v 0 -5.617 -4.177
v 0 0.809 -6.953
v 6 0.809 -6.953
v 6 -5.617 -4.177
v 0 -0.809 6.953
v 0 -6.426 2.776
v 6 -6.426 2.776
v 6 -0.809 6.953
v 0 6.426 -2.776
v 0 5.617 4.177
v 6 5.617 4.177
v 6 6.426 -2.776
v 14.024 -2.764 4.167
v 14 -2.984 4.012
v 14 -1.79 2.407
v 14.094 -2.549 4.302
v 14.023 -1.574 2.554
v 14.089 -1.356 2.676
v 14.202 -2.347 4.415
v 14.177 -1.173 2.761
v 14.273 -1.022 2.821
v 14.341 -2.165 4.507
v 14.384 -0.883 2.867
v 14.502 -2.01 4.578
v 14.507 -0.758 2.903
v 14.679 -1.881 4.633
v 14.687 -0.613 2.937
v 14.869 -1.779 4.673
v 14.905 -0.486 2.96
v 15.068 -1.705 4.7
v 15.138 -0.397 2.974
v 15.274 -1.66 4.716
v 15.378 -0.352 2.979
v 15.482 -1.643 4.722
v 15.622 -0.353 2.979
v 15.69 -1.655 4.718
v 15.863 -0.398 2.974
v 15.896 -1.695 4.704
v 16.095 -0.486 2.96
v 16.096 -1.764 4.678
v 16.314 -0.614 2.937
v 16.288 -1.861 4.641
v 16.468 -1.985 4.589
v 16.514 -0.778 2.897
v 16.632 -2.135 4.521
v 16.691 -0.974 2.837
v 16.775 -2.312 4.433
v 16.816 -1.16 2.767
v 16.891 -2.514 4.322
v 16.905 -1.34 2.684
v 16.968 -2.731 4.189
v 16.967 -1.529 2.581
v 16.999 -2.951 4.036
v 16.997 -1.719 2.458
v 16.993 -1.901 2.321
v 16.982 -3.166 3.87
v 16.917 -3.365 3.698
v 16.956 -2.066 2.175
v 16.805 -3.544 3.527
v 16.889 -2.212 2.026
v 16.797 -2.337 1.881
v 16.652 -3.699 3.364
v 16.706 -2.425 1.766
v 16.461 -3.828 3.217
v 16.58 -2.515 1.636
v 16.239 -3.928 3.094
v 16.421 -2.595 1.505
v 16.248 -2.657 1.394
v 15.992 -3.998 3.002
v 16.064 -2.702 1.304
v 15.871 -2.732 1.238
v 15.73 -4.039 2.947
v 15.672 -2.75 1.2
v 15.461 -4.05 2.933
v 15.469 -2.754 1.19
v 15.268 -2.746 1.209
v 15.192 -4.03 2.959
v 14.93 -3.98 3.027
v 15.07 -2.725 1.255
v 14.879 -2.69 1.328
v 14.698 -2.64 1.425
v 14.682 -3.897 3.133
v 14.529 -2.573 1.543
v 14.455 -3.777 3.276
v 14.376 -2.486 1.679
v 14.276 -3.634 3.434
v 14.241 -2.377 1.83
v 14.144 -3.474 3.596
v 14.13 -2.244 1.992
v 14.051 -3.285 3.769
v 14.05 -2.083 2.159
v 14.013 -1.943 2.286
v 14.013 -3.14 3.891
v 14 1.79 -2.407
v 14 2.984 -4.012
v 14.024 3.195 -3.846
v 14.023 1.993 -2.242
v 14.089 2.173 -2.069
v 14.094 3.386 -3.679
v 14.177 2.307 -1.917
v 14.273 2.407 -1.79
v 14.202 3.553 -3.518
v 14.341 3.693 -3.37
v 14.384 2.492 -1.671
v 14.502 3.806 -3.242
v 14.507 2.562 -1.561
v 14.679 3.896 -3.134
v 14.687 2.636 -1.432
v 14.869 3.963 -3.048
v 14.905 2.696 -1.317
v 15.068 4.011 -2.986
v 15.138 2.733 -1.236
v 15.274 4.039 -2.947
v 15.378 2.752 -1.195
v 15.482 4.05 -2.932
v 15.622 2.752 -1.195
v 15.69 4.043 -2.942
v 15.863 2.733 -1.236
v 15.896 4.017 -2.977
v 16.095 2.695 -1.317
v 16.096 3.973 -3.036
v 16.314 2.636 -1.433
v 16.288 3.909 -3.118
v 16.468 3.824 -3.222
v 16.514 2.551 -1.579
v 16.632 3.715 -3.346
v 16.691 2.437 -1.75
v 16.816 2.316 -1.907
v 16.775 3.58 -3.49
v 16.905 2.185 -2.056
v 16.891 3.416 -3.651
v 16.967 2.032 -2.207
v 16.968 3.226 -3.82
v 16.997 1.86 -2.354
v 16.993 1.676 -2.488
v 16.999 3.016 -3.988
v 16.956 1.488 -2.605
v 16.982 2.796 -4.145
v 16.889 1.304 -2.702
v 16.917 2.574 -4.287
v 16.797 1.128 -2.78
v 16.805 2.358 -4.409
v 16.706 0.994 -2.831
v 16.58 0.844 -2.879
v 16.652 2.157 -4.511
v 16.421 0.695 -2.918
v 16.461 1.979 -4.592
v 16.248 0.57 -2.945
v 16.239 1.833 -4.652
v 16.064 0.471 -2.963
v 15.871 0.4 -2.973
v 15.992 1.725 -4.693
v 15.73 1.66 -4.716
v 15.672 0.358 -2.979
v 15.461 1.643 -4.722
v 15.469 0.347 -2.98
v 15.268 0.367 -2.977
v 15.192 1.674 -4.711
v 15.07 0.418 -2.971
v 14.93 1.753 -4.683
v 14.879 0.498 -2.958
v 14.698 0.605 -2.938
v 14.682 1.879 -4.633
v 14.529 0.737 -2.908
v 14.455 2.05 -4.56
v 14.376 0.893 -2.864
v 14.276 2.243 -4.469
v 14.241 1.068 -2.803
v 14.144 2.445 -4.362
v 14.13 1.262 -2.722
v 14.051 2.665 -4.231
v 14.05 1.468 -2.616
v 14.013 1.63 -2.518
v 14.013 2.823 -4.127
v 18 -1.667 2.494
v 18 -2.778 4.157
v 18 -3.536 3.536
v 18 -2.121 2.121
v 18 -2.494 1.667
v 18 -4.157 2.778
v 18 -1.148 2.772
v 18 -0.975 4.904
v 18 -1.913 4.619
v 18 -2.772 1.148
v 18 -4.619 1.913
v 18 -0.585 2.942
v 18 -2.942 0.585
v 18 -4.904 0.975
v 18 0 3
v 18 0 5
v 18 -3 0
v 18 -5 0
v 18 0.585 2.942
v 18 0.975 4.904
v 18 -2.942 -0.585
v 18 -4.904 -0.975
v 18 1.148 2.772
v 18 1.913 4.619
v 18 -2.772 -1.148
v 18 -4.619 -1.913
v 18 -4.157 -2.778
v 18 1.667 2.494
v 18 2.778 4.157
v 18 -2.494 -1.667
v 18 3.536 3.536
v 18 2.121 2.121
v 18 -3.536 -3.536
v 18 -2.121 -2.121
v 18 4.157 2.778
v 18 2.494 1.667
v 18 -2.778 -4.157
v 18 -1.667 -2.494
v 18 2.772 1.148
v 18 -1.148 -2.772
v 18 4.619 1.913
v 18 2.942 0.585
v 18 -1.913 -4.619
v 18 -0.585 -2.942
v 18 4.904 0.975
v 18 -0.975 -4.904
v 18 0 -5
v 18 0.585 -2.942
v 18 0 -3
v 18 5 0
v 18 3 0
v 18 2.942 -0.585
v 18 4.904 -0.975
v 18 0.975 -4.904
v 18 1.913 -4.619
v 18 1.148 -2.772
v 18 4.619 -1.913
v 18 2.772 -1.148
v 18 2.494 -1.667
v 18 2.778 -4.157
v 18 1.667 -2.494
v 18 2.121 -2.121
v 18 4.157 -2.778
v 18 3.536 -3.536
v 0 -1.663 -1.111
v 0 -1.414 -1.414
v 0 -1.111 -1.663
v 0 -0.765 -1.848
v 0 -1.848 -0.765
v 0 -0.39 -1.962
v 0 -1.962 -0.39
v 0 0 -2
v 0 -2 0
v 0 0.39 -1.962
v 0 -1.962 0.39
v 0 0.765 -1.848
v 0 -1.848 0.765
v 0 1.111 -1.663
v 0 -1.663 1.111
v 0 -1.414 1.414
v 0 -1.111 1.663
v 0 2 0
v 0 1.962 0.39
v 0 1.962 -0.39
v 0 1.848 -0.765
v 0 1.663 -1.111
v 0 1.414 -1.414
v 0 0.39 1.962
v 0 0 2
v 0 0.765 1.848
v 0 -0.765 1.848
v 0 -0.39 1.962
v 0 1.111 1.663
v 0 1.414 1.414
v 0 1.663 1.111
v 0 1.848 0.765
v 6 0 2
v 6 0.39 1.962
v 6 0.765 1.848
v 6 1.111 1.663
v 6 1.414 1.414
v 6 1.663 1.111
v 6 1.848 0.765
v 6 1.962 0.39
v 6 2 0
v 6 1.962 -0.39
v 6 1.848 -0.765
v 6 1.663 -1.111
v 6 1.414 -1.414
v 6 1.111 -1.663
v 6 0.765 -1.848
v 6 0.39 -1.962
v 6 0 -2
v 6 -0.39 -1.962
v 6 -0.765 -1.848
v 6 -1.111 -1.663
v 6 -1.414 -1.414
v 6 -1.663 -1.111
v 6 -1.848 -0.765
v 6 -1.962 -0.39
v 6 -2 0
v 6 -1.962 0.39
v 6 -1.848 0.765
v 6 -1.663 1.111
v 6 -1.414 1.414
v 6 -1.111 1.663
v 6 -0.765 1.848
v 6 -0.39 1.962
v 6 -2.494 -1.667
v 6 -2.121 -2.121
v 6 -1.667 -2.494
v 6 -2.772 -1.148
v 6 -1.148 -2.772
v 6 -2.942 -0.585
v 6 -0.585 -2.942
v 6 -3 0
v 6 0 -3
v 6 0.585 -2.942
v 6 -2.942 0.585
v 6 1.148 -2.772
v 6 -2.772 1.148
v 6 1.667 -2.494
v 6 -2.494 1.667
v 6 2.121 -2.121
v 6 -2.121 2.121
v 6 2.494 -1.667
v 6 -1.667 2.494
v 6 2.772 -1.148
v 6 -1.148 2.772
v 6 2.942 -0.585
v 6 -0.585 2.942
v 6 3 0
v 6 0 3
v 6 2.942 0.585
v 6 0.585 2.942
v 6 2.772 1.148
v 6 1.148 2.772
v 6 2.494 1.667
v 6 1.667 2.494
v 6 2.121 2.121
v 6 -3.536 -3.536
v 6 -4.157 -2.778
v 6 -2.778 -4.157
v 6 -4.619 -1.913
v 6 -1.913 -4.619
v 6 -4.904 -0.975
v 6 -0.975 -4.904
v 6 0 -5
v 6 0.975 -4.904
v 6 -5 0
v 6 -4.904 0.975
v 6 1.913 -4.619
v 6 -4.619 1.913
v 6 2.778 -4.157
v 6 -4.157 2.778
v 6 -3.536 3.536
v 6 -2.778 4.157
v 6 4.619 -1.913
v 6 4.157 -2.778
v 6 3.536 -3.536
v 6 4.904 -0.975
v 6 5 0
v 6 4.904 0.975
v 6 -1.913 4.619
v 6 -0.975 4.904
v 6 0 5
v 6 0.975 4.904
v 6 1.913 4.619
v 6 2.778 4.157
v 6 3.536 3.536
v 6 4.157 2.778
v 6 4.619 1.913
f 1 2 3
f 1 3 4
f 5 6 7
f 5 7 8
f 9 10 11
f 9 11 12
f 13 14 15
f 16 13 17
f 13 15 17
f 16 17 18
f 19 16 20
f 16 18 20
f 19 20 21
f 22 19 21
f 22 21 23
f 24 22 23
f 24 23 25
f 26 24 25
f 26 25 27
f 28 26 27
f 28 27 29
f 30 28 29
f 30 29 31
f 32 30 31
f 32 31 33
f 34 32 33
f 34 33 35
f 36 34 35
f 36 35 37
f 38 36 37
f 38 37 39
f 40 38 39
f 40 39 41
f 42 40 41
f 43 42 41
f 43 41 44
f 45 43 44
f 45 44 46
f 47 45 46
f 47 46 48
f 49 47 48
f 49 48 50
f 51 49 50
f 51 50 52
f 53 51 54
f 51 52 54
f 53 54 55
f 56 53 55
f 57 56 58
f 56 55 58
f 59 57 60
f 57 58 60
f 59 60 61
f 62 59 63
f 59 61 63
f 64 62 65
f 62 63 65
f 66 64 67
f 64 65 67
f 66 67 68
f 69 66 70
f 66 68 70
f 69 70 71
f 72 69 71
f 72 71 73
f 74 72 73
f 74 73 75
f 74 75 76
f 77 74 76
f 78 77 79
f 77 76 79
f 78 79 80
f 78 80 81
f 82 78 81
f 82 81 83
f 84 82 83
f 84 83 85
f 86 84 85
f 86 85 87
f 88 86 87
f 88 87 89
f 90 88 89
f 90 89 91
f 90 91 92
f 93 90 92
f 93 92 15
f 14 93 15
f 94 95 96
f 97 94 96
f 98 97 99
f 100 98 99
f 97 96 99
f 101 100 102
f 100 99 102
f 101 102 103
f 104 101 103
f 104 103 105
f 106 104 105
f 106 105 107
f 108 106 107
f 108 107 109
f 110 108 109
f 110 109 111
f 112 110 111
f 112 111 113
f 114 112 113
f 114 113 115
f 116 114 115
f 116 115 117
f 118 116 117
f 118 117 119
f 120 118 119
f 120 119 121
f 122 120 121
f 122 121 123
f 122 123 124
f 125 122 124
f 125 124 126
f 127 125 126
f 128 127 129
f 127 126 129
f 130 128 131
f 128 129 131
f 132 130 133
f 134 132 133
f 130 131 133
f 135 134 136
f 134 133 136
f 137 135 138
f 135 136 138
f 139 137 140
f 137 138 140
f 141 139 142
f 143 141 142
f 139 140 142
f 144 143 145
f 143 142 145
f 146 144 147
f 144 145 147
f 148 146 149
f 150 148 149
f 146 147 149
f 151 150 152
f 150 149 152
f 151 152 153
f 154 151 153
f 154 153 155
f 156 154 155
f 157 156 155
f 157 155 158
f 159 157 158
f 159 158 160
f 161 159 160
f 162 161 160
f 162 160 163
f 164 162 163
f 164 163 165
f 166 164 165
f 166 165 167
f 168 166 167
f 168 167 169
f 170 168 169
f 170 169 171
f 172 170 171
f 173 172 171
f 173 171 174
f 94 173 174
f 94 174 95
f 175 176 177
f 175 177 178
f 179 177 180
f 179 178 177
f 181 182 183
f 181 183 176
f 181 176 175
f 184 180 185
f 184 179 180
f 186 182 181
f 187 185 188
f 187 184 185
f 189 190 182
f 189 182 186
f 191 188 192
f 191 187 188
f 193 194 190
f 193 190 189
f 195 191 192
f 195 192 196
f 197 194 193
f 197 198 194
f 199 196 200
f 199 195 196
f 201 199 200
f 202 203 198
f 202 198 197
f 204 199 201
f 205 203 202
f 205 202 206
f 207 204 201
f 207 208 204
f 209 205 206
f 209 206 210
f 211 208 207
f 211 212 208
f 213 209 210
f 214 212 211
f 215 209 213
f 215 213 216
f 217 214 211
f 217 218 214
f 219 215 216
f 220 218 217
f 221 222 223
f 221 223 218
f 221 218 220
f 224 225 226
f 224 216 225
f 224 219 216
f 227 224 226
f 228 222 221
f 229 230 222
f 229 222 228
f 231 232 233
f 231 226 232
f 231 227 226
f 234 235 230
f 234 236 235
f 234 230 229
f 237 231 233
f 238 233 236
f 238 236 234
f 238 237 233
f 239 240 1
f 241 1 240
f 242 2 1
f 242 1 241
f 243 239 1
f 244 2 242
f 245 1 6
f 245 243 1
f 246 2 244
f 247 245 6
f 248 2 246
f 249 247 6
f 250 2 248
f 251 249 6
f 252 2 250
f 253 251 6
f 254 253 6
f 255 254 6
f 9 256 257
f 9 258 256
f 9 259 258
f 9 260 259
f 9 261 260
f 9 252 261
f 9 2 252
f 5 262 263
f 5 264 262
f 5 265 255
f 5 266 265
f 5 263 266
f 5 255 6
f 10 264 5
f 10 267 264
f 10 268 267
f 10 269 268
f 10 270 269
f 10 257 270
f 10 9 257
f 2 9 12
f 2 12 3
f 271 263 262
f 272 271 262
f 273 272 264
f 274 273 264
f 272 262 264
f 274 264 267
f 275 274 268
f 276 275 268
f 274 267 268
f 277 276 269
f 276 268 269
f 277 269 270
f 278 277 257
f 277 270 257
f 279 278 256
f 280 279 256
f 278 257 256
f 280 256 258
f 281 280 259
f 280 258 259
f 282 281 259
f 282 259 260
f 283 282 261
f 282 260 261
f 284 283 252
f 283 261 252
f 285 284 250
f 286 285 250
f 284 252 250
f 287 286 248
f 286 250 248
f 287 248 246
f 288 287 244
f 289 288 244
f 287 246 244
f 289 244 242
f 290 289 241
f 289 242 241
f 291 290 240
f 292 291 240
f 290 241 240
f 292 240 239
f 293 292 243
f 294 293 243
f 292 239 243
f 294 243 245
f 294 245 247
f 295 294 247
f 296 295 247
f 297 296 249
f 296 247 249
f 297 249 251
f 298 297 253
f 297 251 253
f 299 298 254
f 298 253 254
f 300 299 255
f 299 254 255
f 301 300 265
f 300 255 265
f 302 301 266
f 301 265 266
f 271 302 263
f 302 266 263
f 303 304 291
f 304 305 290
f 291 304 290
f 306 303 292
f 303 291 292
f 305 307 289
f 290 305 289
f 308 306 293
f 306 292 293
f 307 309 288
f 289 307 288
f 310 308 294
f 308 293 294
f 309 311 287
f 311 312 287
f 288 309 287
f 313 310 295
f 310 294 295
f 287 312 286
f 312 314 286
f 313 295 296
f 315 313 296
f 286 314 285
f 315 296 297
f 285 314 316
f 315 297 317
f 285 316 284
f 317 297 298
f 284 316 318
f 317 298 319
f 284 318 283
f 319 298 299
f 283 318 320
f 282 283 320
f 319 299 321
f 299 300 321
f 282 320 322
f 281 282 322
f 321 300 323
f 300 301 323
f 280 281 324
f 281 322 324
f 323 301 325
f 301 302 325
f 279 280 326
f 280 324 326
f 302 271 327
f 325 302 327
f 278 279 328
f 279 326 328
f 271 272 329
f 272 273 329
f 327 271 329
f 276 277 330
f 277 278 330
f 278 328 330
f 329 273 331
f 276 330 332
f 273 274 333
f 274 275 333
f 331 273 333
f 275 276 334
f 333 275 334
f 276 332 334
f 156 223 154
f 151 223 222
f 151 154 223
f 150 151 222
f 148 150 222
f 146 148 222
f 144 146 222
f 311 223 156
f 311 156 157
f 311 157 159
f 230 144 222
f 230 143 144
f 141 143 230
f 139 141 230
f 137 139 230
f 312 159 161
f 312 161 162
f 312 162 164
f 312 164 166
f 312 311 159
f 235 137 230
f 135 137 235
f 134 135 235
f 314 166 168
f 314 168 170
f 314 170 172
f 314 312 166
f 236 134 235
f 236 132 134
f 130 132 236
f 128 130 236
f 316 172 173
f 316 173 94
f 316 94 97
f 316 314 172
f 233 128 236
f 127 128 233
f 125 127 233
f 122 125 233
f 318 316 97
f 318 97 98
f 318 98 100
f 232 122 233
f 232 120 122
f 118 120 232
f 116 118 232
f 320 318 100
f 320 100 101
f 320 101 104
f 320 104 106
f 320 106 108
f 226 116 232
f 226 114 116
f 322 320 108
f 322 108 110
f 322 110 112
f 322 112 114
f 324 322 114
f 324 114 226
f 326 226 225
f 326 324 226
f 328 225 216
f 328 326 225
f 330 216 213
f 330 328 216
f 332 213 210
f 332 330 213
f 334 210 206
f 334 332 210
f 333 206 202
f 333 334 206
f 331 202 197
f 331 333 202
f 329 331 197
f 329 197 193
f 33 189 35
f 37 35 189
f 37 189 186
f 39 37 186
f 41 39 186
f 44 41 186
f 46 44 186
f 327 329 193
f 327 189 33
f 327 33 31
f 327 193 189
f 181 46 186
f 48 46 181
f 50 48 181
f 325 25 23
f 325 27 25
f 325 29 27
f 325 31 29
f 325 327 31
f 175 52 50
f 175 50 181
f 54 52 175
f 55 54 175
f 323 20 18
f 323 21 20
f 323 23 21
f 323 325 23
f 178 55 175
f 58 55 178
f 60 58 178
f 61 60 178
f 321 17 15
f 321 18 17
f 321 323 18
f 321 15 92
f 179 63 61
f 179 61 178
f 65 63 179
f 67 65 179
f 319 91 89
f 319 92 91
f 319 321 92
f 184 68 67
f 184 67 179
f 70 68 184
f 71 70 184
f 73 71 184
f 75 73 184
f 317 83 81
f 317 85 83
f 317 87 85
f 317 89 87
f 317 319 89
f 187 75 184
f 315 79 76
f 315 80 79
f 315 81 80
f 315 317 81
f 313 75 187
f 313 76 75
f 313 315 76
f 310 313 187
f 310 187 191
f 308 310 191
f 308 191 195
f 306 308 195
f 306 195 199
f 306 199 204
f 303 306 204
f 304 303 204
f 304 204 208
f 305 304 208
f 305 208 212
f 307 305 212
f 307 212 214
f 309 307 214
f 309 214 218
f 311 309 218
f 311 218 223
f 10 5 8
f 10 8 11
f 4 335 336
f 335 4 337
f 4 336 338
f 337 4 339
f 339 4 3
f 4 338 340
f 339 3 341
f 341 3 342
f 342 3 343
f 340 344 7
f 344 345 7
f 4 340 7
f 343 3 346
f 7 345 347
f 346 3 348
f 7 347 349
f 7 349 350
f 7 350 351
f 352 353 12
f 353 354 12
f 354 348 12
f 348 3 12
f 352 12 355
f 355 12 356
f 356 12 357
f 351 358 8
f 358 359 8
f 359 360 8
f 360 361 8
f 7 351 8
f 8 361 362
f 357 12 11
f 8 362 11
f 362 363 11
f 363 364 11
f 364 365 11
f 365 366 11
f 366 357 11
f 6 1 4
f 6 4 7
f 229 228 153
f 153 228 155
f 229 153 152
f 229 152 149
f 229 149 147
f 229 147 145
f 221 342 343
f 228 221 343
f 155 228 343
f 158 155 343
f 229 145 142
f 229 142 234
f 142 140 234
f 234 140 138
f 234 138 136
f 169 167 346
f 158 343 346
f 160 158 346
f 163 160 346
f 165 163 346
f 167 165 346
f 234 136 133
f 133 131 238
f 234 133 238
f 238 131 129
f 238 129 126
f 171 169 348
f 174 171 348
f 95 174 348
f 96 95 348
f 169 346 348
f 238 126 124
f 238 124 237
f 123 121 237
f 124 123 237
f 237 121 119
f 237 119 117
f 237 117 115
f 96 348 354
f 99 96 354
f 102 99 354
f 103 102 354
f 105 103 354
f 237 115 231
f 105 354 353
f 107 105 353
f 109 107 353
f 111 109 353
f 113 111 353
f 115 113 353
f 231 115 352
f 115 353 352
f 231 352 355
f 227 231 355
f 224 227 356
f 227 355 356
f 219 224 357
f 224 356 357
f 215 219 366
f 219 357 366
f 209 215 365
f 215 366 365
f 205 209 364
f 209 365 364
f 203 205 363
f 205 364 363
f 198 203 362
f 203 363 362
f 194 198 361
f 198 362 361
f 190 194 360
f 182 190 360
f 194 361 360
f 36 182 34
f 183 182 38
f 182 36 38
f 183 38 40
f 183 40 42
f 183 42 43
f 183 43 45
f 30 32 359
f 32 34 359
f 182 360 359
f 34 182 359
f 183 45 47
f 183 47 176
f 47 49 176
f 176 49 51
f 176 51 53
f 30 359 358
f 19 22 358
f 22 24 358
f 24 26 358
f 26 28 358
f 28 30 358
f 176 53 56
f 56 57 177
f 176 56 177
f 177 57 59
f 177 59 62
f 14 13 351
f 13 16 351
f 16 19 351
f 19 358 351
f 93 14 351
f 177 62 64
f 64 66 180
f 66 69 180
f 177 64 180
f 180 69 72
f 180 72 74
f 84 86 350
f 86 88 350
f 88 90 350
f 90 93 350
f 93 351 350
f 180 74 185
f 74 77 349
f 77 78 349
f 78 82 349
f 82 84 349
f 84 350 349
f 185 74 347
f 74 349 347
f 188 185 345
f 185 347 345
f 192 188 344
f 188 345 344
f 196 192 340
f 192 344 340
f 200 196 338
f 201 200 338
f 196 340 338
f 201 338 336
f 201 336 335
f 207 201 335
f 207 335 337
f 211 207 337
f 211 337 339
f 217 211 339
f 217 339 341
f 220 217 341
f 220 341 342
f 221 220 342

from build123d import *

# Parameters (mm, degrees)
SKETCH1_R           = 5
SKETCH1_R_2         = 3
BOSS_EXTRUDE1_DEPTH = 18
BOSS_EXTRUDE2_DEPTH = 6
SKETCH3_R           = 2
CUT_EXTRUDE1_DEPTH  = 6
SKETCH4_R           = 1.5
CUT_EXTRUDE2_DEPTH  = 14


with BuildPart() as part:
    # Sketch1 → Boss-Extrude1 (new body)
    with BuildSketch(Plane(origin=(0, 0, 0), x_dir=(0, 0, -1), z_dir=(1, 0, 0))):
        Circle(SKETCH1_R)
        Circle(SKETCH1_R_2, mode=Mode.SUBTRACT)
    extrude(amount=BOSS_EXTRUDE1_DEPTH)

    # Sketch2 → Boss-Extrude2 (add)
    with BuildSketch(Plane.ZY):
        Polygon((-6.953065422, 0.809247324), (-4.177361452, -5.616907628), (2.775703971, -6.426154952), (6.953065422, -0.809247324), (4.177361452, 5.616907628), (-2.775703971, 6.426154952), align=None)
    extrude(amount=-BOSS_EXTRUDE2_DEPTH)

    # Sketch3 → Cut-Extrude1 (cut)
    with BuildSketch(Plane.ZY):
        Circle(SKETCH3_R)
    extrude(amount=-CUT_EXTRUDE1_DEPTH, mode=Mode.SUBTRACT)

    # Sketch4 → Cut-Extrude2 (cut)
    with BuildSketch(Plane(origin=(0, 3.617701138, -4.864384697), x_dir=(-1, 0, 0), z_dir=(0, 0.596765922, -0.802415375))):
        with Locations((-15.5, 0)):
            Circle(SKETCH4_R)
    extrude(amount=-CUT_EXTRUDE2_DEPTH, mode=Mode.SUBTRACT)


solid = part.part
